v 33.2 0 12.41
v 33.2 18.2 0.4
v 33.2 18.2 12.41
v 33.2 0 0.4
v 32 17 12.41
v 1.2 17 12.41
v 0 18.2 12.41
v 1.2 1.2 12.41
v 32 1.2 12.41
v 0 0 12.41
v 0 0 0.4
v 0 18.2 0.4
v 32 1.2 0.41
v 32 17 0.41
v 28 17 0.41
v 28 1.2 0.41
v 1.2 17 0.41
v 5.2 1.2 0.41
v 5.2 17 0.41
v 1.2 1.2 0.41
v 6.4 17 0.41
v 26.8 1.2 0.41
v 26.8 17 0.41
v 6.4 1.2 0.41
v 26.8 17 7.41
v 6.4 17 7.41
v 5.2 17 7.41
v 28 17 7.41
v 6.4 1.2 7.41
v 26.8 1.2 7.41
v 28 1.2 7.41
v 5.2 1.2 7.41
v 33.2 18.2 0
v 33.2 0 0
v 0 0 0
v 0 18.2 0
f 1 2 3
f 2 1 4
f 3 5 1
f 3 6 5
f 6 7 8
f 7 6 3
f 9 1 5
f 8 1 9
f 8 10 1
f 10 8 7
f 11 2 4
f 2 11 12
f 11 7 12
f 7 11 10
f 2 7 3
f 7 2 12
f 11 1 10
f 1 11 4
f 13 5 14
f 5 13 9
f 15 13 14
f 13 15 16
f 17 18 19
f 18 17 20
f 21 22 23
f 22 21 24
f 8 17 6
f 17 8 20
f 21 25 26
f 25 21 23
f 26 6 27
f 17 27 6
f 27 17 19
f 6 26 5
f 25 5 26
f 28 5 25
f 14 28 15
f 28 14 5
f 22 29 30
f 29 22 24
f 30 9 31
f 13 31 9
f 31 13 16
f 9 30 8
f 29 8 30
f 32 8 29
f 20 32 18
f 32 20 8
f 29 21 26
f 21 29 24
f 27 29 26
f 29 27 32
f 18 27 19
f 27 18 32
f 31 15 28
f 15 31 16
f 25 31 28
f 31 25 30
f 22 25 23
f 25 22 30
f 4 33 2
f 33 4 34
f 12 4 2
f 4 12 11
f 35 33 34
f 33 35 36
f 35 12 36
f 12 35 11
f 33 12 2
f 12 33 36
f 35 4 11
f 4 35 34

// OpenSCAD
// file: ../../Base/Rotation.scad
// Fischertechnik Box Foundation
// Geometry Helpers Rotation

include <PlacementOptions.scad>

// getRotatedSpace(space, rotation=NoRotation)
// Rotates the space dependent on the specified rotation

function getRotatedSpace(space, rotation=NoRotation) = [
    (rotation == Rotate90 || rotation == Rotate270) ? space.y : space.x,
    (rotation == Rotate90 || rotation == Rotate270) ? space.x : space.y
];

// Rotates the given space around the fixed left lower corner
// space = the space the children needs as width/depth list [width,depth]
// rotation = 0 Rotate0 degrees, 1 Rotate90 degrees, 2 Rotate180 degrees, 3 Rotate270 degrees (equivalent to -90)

module RotateFix(space, rotation=NoRotation) {
    dy = (rotation == Rotate0 || rotation == Rotate270) ? 0 :
        (rotation == Rotate90) ? space.x :
        space.y;
    dx = (rotation < Rotate180) ? 0 :
        (rotation == Rotate180) ? space.x :
        space.y;
    
    translate([dx, dy, 0])
        rotate([0, 0, rotations[rotation]])
            children();
}
// file: ../../Base/Alignment.scad
// Fischertechnik Box Foundation
// Geometry Helpers Alignment

include <PlacementOptions.scad>

// getAlignedX(elementWidth, spaceWidth, align=AlignRight, offset=0)
// Gets the aligned X offset of an element with the given
// width in the given space.
// elementWidth = The width of the element to positon
// spaceWidth = The space where the element should be aligned
// align = 0 AlignLeft, 1 AlignCenter, 2 AlignRight
// offset = an optional offset from the aligned position. When
// aligned left or centered, then positive values are in X direction.
// When aligned right then positive values are in negative X direction.

function getAlignedX(elementWidth, spaceWidth, align=AlignRight, offset=0) =
    (align == AlignLeft) ?
        offset :
        ((align == AlignCenter) ?
        (spaceWidth - elementWidth)/2 + offset :
        spaceWidth - offset - elementWidth);

// getAlignedY(elementDepth, spaceDepth, align=AlignTop, offset=0)
// Gets the aligned Y offset of an element with the given
// depth in the given space.
// elementDepth = The depth of the element to positon
// spaceDepth = The space where the element should be aligned
// align = 0 AlignBottom, 1 AlignCenter, 2 AlignTop
// offset = an optional offset from the aligned position. When
// aligned bottom or centered, then positive values are in Y direction.
// When aligned top then positive values are in negative Y direction.

function getAlignedY(elementDepth, spaceDepth, align=AlignTop, offset=0) =
    (align == AlignBottom) ?
        offset :
        ((align == AlignCenter) ?
        (spaceDepth - elementDepth)/2 + offset :
        spaceDepth - offset - elementDepth);
// file: ../../Base/PlacementOptions.scad
// Fischertechnik Box Foundation
// Placement Options

// Alignment
NoAlign = 0;
AlignLeft = 1;
AlignBottom = 2;
AlignCenter = 3;
AlignRight = 4;
AlignTop = 5;

// Element rotation degree steps
rotations = [0, -90, -180, -270];

// Rotation
NoRotation = 0;
Rotate0 = 0;
Rotate90 = 1;
Rotate180 = 2;
Rotate270 = 3;

// Docking (seen from above)
NoDock = -1;
DockLeft = 0;
DockTop = 1;
DockRight = 2;
DockCorner = 2;
DockBottom = 3;

// Web corners
LowerLeft = 0;
UpperLeft = 1;
UpperRight = 2;
LowerRight = 3;

// Web position relative to corner
LeftOfCorner = 0;
RightOfCorner = 1;
// file: ../../Base/Boxes.scad
// Fischertechnik Box Foundation
// Pre-designed Boxes

use <Constants.scad>

include <PlacementOptions.scad>

box190Width = 190;
box190Depth = 130;
box130Width = 130;
box130Depth = 95;

// Values are from an original ec3 box
topBottomDifference = 1.5;
outerHeight = 40;
baseThickness = 1.8;
innerHeight = outerHeight - baseThickness;
stackExcess = 5.7;
radius = 3.5;
wallThickness = 1.5;
tolerance = 0.2;

boxWallThickness = wallThickness;
boxBaseThickness = baseThickness;
boxWebWidth = 3.0;

// getBoxWallThickness()
// Gets the wall thickness of a Fischertechnik Box
function getBoxWallThickness() = boxWallThickness;

// getBoxUsageHeight(height = 38.2)
// Gets the usable height of a Fischertechnik box
// height = Outer height of the box from the bottom to the upper edge.
function getBoxUsageHeight(height = outerHeight) = height - baseThickness - stackExcess;

// getBoxInnerHeight()
// Gets the inner height of a Fischertechnik box, including the stack excess
function getBoxInnerHeight() = innerHeight;

// getBoxBaseThickness()
// Gets the thickness of the Fischertechnik box base.
function getBoxBaseThickness() = boxBaseThickness;

// getBoxWebWidth()
// Gets the width of a box web
function getBoxWebWidth() = boxWebWidth;

// getBox190Space()
// Gets the usable inner space of a Box 190 as an x/y-list
function getBox190Space() = [
    box190Width - 2*getBoxWallThickness() - topBottomDifference, 
    box190Depth - 2*getBoxWallThickness() - topBottomDifference ];

// RoundedCornerPlate(width, depth, height, radius)
// Creates a body plate with rounded corners for a box. Used
// also to create the complete box with the hull module.
// width = Width of the plate
// depth = depth of the plate 
// height = thickness of the plate
// radius = radius of the rounded corner
module RoundedCornerPlate(width, depth, height, radius) {
    translate([radius, radius])
    hull() {
        w = width-2*radius;
        d = depth-2*radius;
        cube([w, d, height]);
        cylinder(height, r=radius, $fn=getFragments());
        translate([w, 0])
            cylinder(height, r=radius, $fn=getFragments());
        translate([w, d])
            cylinder(height, r=radius, $fn=getFragments());
        translate([0, d])
            cylinder(height, r=radius, $fn=getFragments());
    }
}

// BoxBase(width, depth)
// Creates an empty stackable Fischertechnik compatible box
// width = Outer width of the box (190, 130, ...)
// depth = Outer depth of the box (130, 95, ...)

module BoxBase(width, depth, height=outerHeight) {    
    thinPlate = 0.01;

    innerHeight = height - baseThickness;    
    
    module Body(tolerance=tolerance) {
        hull() {
            // Bottom with tolerance to fit into the original boxes when stacked
            translate([-wallThickness+tolerance, -wallThickness+tolerance, -baseThickness])
                RoundedCornerPlate(width-topBottomDifference-2*tolerance, depth-topBottomDifference-2*tolerance, thinPlate, radius);
            
            // Top
            translate([-wallThickness-topBottomDifference/2, -wallThickness-topBottomDifference/2, innerHeight-thinPlate])
                RoundedCornerPlate(width, depth, thinPlate, radius);
         }
    }

    module Cutoff() {
        hull() {
            coWidth = width - 2*wallThickness;
            coDepth = depth - 2*wallThickness;
            
            // Bottom
            RoundedCornerPlate(coWidth-topBottomDifference, coDepth-topBottomDifference, thinPlate, radius);

            // Top
            translate([-topBottomDifference/2, -topBottomDifference/2, innerHeight+thinPlate]) 
                RoundedCornerPlate(coWidth, coDepth, thinPlate, radius);
        }
    }
    
    difference() {        
        Body();
        Cutoff();
        stackOffset = innerHeight - stackExcess;
        translate([0, 0, stackOffset + baseThickness])
            Body(tolerance=0);
    }
}

// Creates the Fischertechnik empty box 130x190 mm and places it at position 0,0
// 190x130 are the outer sizes, the inner space is slightly smaller. Use getBox190Space() to get the inner sizes.
// The box is positioned that the usable inner space is at the 0,0,0 position.

module Box190() {
    BoxBase(box190Width, box190Depth);
}

// Gets the usable inner space of a Box 130 as an x/y-list
function getBox130Space() = [
    box130Width - 2*getBoxWallThickness() - topBottomDifference, 
    box130Depth - 2*getBoxWallThickness() - topBottomDifference ];

// Creates the Fischertechnik empty box 95x130 mm and places it at position 0,0
// 190x130 are the outer sizes, the inner space is slightly smaller. Use getBox190Space() to get the inner sizes.
// The box is positioned that the usable inner space is at the 0,0,0 position.

module Box130() {
    BoxBase(box130Width, box130Depth);
}

// Creates a web at the specified box walls
// corner 0 = LowerLeft, 1 = UpperLeft, 2 = UpperRight, 3 = LowerRight
// side 0 = LeftOfCorner, 1 = RightOfCorner
// distance = Distance in mm from the corner
// boxSpace = inner width and depth of the box (default: Box 190)
// webWidth = length of the web (default is 3 mms)
// webThickness = thickness of the web (default is 1 mm)
// height = Height of the web (standard is getBoxUsageHeight())
// sink = How much of the web is sunk into the wall

module BoxWeb(
    corner, 
    side, 
    distance, 
    boxSpace=getBox190Space(), 
    webWidth=getBoxWebWidth(), 
    webThickness=1.0, 
    height=getBoxUsageHeight(),
    sink = getBoxWallThickness()/2) {
    width = (corner % 2 == 0) ? 
            (side == LeftOfCorner ? webWidth : webThickness) :
            (side == LeftOfCorner ? webThickness : webWidth);

    depth = (corner % 2 == 0) ? 
            (side == RightOfCorner ? webWidth : webThickness) :
            (side == RightOfCorner ? webThickness : webWidth);
    
    xDiff = corner == LowerLeft ? 
                (side == LeftOfCorner ? -sink : distance) :
            (corner == UpperLeft ?                
                (side == LeftOfCorner ? distance : -sink) :
            (corner == UpperRight ?
                (side == LeftOfCorner ? boxSpace.x-webWidth+sink : boxSpace.x-distance-webThickness) :
                (side == LeftOfCorner ? boxSpace.x-distance-webThickness: boxSpace.x-webWidth+sink)));

    yDiff = corner == LowerLeft ? 
                (side == RightOfCorner ? -sink : distance) :
            (corner == UpperLeft ?
                (side == RightOfCorner ? boxSpace.y-distance-webThickness : boxSpace.y-webWidth+sink) :
            (corner == UpperRight ?
                (side == RightOfCorner ? boxSpace.y-webWidth+sink : boxSpace.y-distance-webThickness) :
                (side == RightOfCorner ? distance : -sink)));
    
    translate([xDiff, yDiff, -getExcess()])
        cube([width, depth, height + 2*getExcess()]);
}
// file: ../../Base/Placement.scad
// Fischertechnik Box Foundation
// Geometry Helpers Placement

use <Constants.scad>
use <Alignment.scad>
use <Rotation.scad>
use <Boxes.scad>

include <PlacementOptions.scad>

// Place(x=0, y=0, elementSpace=[0,0], alignX=AlignLeft, alignY=AlignBottom, rotation=Rotate0, boxSpace=getBox190Space())
// Places the child at the specified position
// y = Y-Position. This is a relative position when an X aligment is specified.
// x = X-Position. This is a relative position when an Y aligment is specified.
// elementSpace = space of the element to be placed [x,y]
// alignX = -1=NoAlign, 0 AlignLeft, 1 AlignCenter, 3 AlignRight (elementSpace and boxSpace required!)
// alignY = -1=NoAlign, 2 AlignBottom, 1 AlignCenter, 4 AlignTop (elementSpace and boxSpace required!)
// rotation = 0 Rotate0 0 degrees, 1 Rotate90 90 degrees, 
// 2 Rotate180 180 degrees, 3 Rotate270 270 degrees (equivalent to -90)
// boxSpace = Inner space of the box where the placement occurs [x,y] - default is Box 190x130 inner space

module Place(x=0, y=0, elementSpace=[0,0], 
  alignX=AlignLeft, alignY=AlignBottom, 
  rotation=NoRotation, boxSpace=getBox190Space()) {

    module Position(x, y, space, rotation=Rotate0) {
        translate([x, y, 0])
            RotateFix(space, rotation)
                children();
    }

    space = getRotatedSpace(elementSpace, rotation);
    alignedX = getAlignedX(space.x, boxSpace.x, alignX, x);
    alignedY = getAlignedY(space.y, boxSpace.y, alignY, y);
    Position(alignedX, alignedY, elementSpace, rotation)
        children();
}

// Center(space=getBox130Space(), elementSpace=[0,0])
// space = Space where the children is centered. For cylinder use centered=true and no elementSpace.
// elementSpace = space of the element to be centered [x,y]

module Center(space=getBox190Space(), elementSpace=[0,0]) {
    Place(elementSpace=elementSpace, boxSpace=space, alignX=AlignCenter, alignY=AlignCenter)
        children();
}

// CenterHorizontal(width=0, y=0, offset=0, space=getBox130Space())
// width = Width of the element to be placed.
// y = Y position of the element
// offset = Offset from the center position (negative will be left of the center)
// space = Space where the element is placed

module CenterHorizontal(width=0, y=0, offset=0, space=getBox190Space()) {
    Place(x=offset, y=y, elementSpace=[width, 0], boxSpace=space, alignX=AlignCenter)
        children(0);
}

// CenterVertical(depth=0, x=0, offset=0, space=getBox130Space())
// depth = Depth of the element to be placed.
// x = X position of the element
// offset = Offset from the center position (negative will be down of the center)
// space = Space where the element is placed

module CenterVertical(depth=0, x=0, offset=0, space=getBox190Space()) {
    Place(x=x, y=offset, elementSpace=[0, depth], boxSpace=space, alignY=AlignCenter)
        children(0);
}

// getIsVertical(align)
// True if the specified alignment needs a vertical orientation for a divider (AlignRight, AlignLeft)

function getIsVertical(align) = (align == AlignRight || align == AlignLeft);

// getIsHorizontal(align)
// True if the specified alignment needs a horizontal orientation for a divider (AlignTop, AlignBottom)

function getIsHorizontal(align) = (align == AlignTop || align == AlignBottom);
// file: ../../Elements/AxisClip10.scad
// Fischertechnik Box Library
// Axis for clip 10
// 31023

use <../ModelBase/Simple.scad>
use <../Base/Constants.scad>

/* [Element Parameters] */
height = 23;
clipHeight = 10;

/* [Hidden] */
width = 12;
depth = 12;
upperDiameter = 3.6;

// getAxisClip10Space()
// Gets the space of a n axis for a clip 10 with spring ring (mot2)

function getAxisClip10Space() = [width, depth, height];

// AxisClip10(height, clipHeight)
// Axis for clip 10 with spring ring (mot2)
// height = Height of the complete axis (standard is 23, in mot3 its only 12)
// clipHeight = Height of the part for the clip (standard is 10, in mot3 its only 7)

module AxisClip10(height=height, clipHeight=clipHeight) {
    LeveledAxisWithSpace(height, height-clipHeight, getAxisClip10Space(), diameter=upperDiameter);
}

// Test
color("lightgray")
AxisClip10(height, clipHeight);
// file: ../../Base/Constants.scad
// Fischertechnik Box Foundation
// Constants

// Constant values necessary for multiple elements

// Base constants
dividerThickness = 1.2;
excess = 0.01;
fragments = 90;
tolerance = 0.8;

// Gets the thickness of a divider 
function getDividerThickness() = dividerThickness;

// Gets the excess that is used to merge walls into each other
function getExcess() = excess;

// Gets amount of fragments of a cylinder
function getFragments() = fragments;

// Gets the inner tolerance of a frame to each side
function getTolerance() = tolerance;


// Fischertechnik specific constants
axisDiameter = 4;
axisBottomDiameter = axisDiameter + 1;
axisTolerance = 0.2;

// Gets axis diameter of Fischertechnik axis
function getAxisDiameter() = axisDiameter;

// Gets axis diameter tolerance (subtracted for element axis)
function getAxisTolerance() = axisTolerance;

// Gets the axis diameter for standing axis
function getStandAxisDiameter() = getAxisDiameter() - getAxisTolerance();

// Gets axis bottom diameter for thicker part at the bottom
function getAxisBottomDiameter() = axisBottomDiameter;

pinHeight = 2.5;

// gets the height of a connecting pin
function getPinHeight() = pinHeight;

standardEdgeDistance = 2.5;
standardWebDistance = 11.5;
standardCornerLength = 15;

// gets the standard distance to the wall of the box for dockable frames with webs
function getStandardEdgeDistance() = standardEdgeDistance;

// gets the standard distance of each web to the corner of the dockable frame
function getStandardWebDistance() = standardWebDistance;

// gets the standard length of the corner walls of a dockable frame
function getStandardCornerLength() = standardCornerLength;

tubeWallFactor = 0.8;

// gets the wall thickness of a tube.
function getTubeWallThickness() = tubeWallFactor * getDividerThickness();

smallPartsFrameHeight = 20;

// gets the frame height for docked small parts boxes.
function getSmallPartsFrameHeight() = smallPartsFrameHeight;

hubRingDiameter = 19.5;
hubRingLevelDiameter = 21;

// gets the diameter of a tube matching the inner ring of a wheel
function getHubRingDiameter() = hubRingDiameter;

// gets the diameter of a hub tube with a thicker diameter
function getHubRingLevelDiameter() = hubRingLevelDiameter;
// file: ../../Elements/FrameSwivelBaseForMiniMotor.scad
// Fischertechnik Box Library
// Frame for a swivel base for mini-motor
// 31070

use <../Base/Constants.scad>
use <../ModelBase/Simple.scad>

/* [Hidden] */
width = 30;
depth = 15;
height = 12;
volume = [width, depth, height];

// getFrameSwivelBaseForMiniMotorSpace()
// Gets the space of a frame for a swivel base for mini-motor 

function getFrameSwivelBaseForMiniMotorSpace() = getFrameOuterVolume(volume);

// FrameSwivelBaseForMiniMotor()
// frame for for a swivel base for mini-motor

module FrameSwivelBaseForMiniMotor() {
    Frame([width, depth, height]);

    webHeight = 7;
    webVolume = [getDividerThickness(), getFrameInnerVolume(volume).y + 2*getExcess(), webHeight];

    translate([0, getDividerThickness() - getExcess()]) {
        distance = 4;
        translate([getDividerThickness() + distance, 0])
            Wall(webVolume);
        translate([getFrameSwivelBaseForMiniMotorSpace().x - 2*getDividerThickness() - distance, 0])
            Wall(webVolume);
    }
}

// Tests
color("lightgray")
FrameSwivelBaseForMiniMotor();
// file: ../TestPrint.scad
// 3D Print Test Base

use <../Base/Constants.scad>

use <../Elements/AxisClip10.scad>

module TestPrint(elementSpace) {
    cube([elementSpace.x, elementSpace.y, 0.4]);
    translate([0,0,0.4+getExcess()]) {
        children();
    }
}

TestPrint(getAxisClip10Space())
    AxisClip10();
// main file
// 3D Print Test
// FrameSwivelBaseForMiniMotor

use <../TestPrint.scad>
use <../../Elements/FrameSwivelBaseForMiniMotor.scad>

TestPrint(getFrameSwivelBaseForMiniMotorSpace())
    FrameSwivelBaseForMiniMotor();
